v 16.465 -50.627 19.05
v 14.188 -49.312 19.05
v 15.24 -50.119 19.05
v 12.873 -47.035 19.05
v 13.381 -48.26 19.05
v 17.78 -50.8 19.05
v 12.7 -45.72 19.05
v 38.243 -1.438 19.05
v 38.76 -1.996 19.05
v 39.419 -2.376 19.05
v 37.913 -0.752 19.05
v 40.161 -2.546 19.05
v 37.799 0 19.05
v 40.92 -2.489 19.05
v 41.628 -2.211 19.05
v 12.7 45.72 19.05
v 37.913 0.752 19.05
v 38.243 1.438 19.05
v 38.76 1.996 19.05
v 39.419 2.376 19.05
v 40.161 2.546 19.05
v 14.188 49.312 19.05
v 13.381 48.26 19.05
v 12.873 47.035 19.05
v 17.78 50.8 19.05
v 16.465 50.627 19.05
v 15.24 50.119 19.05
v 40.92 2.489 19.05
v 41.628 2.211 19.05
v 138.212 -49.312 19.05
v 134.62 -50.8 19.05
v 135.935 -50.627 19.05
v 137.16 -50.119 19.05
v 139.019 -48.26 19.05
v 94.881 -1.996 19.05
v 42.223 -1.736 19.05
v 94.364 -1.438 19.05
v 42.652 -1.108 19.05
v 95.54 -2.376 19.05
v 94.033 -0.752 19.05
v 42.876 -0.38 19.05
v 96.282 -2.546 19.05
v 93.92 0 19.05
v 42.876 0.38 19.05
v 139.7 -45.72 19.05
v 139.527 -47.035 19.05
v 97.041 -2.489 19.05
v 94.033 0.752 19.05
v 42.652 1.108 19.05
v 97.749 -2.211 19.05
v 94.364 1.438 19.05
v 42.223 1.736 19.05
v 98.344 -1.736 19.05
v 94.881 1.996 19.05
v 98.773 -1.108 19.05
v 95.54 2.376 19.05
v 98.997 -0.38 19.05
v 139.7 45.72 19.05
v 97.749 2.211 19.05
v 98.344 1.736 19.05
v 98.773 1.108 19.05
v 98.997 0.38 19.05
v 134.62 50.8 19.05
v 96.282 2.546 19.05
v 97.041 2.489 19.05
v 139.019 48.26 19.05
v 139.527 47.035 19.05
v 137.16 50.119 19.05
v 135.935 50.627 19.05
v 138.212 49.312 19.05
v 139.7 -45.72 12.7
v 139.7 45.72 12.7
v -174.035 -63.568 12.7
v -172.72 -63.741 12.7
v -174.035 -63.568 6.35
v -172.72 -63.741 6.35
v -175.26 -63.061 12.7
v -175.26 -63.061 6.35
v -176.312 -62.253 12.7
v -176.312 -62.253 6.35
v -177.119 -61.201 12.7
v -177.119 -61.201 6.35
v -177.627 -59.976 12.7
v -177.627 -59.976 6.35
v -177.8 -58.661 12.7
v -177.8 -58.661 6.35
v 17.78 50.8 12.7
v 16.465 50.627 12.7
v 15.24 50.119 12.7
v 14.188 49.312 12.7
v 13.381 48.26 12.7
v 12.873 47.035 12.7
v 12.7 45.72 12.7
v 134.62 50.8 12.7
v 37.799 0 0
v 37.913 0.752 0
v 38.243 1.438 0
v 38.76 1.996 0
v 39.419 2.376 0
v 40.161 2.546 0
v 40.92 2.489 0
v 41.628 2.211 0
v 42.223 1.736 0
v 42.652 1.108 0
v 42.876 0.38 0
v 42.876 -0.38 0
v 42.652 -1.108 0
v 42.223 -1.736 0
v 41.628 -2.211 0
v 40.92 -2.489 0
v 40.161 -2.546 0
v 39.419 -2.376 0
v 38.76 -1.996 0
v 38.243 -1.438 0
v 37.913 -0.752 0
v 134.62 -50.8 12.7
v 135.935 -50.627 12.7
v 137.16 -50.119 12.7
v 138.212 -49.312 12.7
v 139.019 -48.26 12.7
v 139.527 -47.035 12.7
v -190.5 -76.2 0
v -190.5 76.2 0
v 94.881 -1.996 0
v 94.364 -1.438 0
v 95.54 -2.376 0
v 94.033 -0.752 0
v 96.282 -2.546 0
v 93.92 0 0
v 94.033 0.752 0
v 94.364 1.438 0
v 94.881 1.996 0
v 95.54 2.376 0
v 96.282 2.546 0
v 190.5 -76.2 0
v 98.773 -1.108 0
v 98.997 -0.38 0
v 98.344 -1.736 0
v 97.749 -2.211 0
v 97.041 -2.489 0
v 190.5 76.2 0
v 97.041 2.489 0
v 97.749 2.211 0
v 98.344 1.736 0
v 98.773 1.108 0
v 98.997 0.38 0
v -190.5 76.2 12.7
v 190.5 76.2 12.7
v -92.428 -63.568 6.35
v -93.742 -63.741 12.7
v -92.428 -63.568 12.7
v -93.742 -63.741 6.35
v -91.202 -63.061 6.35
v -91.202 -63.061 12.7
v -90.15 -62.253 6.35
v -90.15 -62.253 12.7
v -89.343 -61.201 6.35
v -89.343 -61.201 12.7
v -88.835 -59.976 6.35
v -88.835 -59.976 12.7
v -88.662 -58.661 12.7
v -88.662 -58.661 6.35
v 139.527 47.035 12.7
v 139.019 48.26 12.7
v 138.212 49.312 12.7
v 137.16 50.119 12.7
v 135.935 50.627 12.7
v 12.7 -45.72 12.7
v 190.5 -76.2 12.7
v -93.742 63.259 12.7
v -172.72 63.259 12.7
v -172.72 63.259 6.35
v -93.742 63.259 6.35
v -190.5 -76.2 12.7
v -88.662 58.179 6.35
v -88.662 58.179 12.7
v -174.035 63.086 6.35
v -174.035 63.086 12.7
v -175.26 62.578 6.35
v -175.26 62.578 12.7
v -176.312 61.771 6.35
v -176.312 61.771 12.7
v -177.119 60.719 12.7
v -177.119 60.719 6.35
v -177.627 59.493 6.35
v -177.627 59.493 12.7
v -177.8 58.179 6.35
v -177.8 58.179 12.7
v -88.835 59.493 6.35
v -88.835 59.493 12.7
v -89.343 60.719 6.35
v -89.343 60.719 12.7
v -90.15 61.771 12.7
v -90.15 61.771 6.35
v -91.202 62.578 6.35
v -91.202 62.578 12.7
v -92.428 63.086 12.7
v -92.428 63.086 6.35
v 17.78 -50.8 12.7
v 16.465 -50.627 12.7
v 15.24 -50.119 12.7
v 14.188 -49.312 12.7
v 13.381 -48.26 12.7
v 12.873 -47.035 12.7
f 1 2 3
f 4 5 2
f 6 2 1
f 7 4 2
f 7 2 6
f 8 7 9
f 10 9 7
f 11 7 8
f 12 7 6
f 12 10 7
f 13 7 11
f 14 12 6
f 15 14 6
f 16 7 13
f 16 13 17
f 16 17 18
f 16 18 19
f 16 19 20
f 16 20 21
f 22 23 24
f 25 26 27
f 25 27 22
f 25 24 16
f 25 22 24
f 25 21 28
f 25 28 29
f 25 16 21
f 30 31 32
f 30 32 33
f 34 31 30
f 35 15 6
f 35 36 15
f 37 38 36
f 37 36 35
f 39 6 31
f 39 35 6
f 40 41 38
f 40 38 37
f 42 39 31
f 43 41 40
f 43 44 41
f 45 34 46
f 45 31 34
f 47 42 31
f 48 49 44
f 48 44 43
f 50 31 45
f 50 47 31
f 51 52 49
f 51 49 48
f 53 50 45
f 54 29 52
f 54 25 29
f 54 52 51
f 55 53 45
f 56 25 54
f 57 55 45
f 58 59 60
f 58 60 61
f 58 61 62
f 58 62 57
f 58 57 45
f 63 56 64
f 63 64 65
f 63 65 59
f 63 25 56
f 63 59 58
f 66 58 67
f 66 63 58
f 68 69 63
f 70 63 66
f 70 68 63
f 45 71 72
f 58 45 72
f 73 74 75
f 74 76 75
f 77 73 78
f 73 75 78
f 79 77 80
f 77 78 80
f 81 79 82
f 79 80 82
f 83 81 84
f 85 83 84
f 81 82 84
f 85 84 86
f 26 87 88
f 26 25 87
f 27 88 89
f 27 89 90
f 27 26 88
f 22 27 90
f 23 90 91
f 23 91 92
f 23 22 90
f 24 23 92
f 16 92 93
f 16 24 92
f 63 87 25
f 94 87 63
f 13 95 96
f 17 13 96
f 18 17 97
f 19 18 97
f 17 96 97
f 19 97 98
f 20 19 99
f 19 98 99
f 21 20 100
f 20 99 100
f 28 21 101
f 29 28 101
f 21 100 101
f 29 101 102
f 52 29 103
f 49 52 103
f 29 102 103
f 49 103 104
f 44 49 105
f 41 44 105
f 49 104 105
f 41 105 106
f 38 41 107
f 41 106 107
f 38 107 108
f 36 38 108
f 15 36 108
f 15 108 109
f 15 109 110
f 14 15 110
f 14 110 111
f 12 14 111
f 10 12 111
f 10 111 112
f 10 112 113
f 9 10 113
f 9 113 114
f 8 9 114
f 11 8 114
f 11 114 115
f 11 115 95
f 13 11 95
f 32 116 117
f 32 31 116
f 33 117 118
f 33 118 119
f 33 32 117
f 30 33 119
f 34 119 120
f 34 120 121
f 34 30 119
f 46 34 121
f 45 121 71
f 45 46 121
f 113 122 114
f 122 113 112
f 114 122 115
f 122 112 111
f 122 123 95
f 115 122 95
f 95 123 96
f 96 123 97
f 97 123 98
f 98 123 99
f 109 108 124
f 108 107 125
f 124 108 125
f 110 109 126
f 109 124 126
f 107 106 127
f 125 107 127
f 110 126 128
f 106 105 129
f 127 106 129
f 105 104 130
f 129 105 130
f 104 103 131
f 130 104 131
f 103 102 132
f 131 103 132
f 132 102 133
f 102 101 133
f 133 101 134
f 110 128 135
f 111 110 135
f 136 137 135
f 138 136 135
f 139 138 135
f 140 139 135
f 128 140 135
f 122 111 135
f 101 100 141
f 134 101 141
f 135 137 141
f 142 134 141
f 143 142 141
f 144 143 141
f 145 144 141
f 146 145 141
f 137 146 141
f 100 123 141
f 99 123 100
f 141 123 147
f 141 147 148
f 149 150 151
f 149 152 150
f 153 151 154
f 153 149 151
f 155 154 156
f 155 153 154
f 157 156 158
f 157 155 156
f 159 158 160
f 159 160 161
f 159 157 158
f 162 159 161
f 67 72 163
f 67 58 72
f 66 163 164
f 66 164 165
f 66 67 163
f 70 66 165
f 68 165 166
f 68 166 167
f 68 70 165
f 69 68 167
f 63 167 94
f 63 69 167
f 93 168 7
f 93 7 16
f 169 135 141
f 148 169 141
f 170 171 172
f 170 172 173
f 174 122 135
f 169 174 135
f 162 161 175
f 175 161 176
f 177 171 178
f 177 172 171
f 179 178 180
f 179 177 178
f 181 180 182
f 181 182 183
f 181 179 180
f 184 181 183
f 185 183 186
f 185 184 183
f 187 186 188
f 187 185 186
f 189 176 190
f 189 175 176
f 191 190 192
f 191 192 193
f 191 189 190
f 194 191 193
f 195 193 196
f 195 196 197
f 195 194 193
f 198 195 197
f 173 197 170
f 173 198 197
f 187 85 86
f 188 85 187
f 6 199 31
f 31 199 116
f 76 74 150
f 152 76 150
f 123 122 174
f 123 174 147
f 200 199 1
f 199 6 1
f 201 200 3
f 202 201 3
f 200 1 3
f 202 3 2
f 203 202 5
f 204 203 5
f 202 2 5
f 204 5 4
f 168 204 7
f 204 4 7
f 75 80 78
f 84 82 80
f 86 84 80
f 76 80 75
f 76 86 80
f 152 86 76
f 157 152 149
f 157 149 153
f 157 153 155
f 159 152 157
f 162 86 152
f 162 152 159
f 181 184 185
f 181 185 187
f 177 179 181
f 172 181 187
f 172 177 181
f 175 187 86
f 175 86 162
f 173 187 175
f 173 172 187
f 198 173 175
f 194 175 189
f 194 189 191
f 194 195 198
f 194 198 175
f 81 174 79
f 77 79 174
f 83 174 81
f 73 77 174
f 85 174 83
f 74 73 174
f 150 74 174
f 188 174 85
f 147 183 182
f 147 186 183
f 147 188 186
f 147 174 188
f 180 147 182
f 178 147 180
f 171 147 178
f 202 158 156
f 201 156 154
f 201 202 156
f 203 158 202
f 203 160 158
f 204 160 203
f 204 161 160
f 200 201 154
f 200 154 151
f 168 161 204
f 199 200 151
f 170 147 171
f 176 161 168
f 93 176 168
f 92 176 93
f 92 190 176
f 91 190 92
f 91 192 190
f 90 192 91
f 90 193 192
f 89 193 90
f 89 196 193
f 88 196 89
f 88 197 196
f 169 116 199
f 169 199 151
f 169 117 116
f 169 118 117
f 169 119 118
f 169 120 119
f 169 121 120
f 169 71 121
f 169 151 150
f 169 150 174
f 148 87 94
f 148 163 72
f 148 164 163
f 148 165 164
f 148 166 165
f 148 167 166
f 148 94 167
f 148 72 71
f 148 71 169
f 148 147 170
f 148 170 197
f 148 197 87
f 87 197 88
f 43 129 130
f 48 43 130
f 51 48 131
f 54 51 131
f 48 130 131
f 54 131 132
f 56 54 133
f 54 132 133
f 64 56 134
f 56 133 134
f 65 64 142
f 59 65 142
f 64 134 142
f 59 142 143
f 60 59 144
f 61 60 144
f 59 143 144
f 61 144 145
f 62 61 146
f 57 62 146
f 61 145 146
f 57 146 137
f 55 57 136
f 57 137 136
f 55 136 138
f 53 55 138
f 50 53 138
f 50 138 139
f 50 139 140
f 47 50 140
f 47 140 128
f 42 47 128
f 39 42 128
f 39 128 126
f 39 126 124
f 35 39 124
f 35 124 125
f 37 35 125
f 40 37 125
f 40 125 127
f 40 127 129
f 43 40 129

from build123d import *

# Parameters (mm, degrees)
F0_W     = 381
F0_H     = 152.4
F1_DEPTH = 12.7
F2_W     = 89.1376596271
F2_H     = 127
F3_DEPTH = 6.35
F4_R     = 5.08
F5_W     = 127
F5_H     = 101.6
F6_DEPTH = 6.35
F7_R     = 5.08
F9_D     = 5.1054


with BuildPart() as f1:
    # F0 (on Top) → F1 (new body)
    with BuildSketch(Plane.XY):
        Rectangle(F0_W, F0_H)
    extrude(amount=F1_DEPTH)

    # F2 (on face) → F3 (cut)
    with BuildSketch(Plane.XY.offset(12.7)):
        with Locations((-133.2311701864, -0.2413299241)):
            Rectangle(F2_W, F2_H)
    extrude(amount=-F3_DEPTH, mode=Mode.SUBTRACT)

    # F4
    f4_edges = [f1.edges().sort_by_distance(p)[0] for p in [
        (-177.8, 63.25867, 9.525),
        (-177.8, -63.74133, 9.525),
        (-88.66234, 63.25867, 9.525),
        (-88.66234, -63.74133, 9.525),
    ]]
    fillet(f4_edges, radius=F4_R)

    # F5 (on face) → F6 (join)
    with BuildSketch(Plane.XY.offset(12.7)):
        with Locations((76.2, 0)):
            Rectangle(F5_W, F5_H)
    extrude(amount=F6_DEPTH)

    # F7
    f7_edges = [f1.edges().sort_by_distance(p)[0] for p in [
        (12.7, -50.8, 15.875),
        (139.7, -50.8, 15.875),
        (139.7, 50.8, 15.875),
        (12.7, 50.8, 15.875),
    ]]
    fillet(f7_edges, radius=F7_R)

    # F9 (through all)
    with Locations(Plane.XY.offset(19.05)):
        with Locations((40.3518900275, 0), (96.4727550745, 0)):
            Hole(F9_D / 2)


solid = f1.part
